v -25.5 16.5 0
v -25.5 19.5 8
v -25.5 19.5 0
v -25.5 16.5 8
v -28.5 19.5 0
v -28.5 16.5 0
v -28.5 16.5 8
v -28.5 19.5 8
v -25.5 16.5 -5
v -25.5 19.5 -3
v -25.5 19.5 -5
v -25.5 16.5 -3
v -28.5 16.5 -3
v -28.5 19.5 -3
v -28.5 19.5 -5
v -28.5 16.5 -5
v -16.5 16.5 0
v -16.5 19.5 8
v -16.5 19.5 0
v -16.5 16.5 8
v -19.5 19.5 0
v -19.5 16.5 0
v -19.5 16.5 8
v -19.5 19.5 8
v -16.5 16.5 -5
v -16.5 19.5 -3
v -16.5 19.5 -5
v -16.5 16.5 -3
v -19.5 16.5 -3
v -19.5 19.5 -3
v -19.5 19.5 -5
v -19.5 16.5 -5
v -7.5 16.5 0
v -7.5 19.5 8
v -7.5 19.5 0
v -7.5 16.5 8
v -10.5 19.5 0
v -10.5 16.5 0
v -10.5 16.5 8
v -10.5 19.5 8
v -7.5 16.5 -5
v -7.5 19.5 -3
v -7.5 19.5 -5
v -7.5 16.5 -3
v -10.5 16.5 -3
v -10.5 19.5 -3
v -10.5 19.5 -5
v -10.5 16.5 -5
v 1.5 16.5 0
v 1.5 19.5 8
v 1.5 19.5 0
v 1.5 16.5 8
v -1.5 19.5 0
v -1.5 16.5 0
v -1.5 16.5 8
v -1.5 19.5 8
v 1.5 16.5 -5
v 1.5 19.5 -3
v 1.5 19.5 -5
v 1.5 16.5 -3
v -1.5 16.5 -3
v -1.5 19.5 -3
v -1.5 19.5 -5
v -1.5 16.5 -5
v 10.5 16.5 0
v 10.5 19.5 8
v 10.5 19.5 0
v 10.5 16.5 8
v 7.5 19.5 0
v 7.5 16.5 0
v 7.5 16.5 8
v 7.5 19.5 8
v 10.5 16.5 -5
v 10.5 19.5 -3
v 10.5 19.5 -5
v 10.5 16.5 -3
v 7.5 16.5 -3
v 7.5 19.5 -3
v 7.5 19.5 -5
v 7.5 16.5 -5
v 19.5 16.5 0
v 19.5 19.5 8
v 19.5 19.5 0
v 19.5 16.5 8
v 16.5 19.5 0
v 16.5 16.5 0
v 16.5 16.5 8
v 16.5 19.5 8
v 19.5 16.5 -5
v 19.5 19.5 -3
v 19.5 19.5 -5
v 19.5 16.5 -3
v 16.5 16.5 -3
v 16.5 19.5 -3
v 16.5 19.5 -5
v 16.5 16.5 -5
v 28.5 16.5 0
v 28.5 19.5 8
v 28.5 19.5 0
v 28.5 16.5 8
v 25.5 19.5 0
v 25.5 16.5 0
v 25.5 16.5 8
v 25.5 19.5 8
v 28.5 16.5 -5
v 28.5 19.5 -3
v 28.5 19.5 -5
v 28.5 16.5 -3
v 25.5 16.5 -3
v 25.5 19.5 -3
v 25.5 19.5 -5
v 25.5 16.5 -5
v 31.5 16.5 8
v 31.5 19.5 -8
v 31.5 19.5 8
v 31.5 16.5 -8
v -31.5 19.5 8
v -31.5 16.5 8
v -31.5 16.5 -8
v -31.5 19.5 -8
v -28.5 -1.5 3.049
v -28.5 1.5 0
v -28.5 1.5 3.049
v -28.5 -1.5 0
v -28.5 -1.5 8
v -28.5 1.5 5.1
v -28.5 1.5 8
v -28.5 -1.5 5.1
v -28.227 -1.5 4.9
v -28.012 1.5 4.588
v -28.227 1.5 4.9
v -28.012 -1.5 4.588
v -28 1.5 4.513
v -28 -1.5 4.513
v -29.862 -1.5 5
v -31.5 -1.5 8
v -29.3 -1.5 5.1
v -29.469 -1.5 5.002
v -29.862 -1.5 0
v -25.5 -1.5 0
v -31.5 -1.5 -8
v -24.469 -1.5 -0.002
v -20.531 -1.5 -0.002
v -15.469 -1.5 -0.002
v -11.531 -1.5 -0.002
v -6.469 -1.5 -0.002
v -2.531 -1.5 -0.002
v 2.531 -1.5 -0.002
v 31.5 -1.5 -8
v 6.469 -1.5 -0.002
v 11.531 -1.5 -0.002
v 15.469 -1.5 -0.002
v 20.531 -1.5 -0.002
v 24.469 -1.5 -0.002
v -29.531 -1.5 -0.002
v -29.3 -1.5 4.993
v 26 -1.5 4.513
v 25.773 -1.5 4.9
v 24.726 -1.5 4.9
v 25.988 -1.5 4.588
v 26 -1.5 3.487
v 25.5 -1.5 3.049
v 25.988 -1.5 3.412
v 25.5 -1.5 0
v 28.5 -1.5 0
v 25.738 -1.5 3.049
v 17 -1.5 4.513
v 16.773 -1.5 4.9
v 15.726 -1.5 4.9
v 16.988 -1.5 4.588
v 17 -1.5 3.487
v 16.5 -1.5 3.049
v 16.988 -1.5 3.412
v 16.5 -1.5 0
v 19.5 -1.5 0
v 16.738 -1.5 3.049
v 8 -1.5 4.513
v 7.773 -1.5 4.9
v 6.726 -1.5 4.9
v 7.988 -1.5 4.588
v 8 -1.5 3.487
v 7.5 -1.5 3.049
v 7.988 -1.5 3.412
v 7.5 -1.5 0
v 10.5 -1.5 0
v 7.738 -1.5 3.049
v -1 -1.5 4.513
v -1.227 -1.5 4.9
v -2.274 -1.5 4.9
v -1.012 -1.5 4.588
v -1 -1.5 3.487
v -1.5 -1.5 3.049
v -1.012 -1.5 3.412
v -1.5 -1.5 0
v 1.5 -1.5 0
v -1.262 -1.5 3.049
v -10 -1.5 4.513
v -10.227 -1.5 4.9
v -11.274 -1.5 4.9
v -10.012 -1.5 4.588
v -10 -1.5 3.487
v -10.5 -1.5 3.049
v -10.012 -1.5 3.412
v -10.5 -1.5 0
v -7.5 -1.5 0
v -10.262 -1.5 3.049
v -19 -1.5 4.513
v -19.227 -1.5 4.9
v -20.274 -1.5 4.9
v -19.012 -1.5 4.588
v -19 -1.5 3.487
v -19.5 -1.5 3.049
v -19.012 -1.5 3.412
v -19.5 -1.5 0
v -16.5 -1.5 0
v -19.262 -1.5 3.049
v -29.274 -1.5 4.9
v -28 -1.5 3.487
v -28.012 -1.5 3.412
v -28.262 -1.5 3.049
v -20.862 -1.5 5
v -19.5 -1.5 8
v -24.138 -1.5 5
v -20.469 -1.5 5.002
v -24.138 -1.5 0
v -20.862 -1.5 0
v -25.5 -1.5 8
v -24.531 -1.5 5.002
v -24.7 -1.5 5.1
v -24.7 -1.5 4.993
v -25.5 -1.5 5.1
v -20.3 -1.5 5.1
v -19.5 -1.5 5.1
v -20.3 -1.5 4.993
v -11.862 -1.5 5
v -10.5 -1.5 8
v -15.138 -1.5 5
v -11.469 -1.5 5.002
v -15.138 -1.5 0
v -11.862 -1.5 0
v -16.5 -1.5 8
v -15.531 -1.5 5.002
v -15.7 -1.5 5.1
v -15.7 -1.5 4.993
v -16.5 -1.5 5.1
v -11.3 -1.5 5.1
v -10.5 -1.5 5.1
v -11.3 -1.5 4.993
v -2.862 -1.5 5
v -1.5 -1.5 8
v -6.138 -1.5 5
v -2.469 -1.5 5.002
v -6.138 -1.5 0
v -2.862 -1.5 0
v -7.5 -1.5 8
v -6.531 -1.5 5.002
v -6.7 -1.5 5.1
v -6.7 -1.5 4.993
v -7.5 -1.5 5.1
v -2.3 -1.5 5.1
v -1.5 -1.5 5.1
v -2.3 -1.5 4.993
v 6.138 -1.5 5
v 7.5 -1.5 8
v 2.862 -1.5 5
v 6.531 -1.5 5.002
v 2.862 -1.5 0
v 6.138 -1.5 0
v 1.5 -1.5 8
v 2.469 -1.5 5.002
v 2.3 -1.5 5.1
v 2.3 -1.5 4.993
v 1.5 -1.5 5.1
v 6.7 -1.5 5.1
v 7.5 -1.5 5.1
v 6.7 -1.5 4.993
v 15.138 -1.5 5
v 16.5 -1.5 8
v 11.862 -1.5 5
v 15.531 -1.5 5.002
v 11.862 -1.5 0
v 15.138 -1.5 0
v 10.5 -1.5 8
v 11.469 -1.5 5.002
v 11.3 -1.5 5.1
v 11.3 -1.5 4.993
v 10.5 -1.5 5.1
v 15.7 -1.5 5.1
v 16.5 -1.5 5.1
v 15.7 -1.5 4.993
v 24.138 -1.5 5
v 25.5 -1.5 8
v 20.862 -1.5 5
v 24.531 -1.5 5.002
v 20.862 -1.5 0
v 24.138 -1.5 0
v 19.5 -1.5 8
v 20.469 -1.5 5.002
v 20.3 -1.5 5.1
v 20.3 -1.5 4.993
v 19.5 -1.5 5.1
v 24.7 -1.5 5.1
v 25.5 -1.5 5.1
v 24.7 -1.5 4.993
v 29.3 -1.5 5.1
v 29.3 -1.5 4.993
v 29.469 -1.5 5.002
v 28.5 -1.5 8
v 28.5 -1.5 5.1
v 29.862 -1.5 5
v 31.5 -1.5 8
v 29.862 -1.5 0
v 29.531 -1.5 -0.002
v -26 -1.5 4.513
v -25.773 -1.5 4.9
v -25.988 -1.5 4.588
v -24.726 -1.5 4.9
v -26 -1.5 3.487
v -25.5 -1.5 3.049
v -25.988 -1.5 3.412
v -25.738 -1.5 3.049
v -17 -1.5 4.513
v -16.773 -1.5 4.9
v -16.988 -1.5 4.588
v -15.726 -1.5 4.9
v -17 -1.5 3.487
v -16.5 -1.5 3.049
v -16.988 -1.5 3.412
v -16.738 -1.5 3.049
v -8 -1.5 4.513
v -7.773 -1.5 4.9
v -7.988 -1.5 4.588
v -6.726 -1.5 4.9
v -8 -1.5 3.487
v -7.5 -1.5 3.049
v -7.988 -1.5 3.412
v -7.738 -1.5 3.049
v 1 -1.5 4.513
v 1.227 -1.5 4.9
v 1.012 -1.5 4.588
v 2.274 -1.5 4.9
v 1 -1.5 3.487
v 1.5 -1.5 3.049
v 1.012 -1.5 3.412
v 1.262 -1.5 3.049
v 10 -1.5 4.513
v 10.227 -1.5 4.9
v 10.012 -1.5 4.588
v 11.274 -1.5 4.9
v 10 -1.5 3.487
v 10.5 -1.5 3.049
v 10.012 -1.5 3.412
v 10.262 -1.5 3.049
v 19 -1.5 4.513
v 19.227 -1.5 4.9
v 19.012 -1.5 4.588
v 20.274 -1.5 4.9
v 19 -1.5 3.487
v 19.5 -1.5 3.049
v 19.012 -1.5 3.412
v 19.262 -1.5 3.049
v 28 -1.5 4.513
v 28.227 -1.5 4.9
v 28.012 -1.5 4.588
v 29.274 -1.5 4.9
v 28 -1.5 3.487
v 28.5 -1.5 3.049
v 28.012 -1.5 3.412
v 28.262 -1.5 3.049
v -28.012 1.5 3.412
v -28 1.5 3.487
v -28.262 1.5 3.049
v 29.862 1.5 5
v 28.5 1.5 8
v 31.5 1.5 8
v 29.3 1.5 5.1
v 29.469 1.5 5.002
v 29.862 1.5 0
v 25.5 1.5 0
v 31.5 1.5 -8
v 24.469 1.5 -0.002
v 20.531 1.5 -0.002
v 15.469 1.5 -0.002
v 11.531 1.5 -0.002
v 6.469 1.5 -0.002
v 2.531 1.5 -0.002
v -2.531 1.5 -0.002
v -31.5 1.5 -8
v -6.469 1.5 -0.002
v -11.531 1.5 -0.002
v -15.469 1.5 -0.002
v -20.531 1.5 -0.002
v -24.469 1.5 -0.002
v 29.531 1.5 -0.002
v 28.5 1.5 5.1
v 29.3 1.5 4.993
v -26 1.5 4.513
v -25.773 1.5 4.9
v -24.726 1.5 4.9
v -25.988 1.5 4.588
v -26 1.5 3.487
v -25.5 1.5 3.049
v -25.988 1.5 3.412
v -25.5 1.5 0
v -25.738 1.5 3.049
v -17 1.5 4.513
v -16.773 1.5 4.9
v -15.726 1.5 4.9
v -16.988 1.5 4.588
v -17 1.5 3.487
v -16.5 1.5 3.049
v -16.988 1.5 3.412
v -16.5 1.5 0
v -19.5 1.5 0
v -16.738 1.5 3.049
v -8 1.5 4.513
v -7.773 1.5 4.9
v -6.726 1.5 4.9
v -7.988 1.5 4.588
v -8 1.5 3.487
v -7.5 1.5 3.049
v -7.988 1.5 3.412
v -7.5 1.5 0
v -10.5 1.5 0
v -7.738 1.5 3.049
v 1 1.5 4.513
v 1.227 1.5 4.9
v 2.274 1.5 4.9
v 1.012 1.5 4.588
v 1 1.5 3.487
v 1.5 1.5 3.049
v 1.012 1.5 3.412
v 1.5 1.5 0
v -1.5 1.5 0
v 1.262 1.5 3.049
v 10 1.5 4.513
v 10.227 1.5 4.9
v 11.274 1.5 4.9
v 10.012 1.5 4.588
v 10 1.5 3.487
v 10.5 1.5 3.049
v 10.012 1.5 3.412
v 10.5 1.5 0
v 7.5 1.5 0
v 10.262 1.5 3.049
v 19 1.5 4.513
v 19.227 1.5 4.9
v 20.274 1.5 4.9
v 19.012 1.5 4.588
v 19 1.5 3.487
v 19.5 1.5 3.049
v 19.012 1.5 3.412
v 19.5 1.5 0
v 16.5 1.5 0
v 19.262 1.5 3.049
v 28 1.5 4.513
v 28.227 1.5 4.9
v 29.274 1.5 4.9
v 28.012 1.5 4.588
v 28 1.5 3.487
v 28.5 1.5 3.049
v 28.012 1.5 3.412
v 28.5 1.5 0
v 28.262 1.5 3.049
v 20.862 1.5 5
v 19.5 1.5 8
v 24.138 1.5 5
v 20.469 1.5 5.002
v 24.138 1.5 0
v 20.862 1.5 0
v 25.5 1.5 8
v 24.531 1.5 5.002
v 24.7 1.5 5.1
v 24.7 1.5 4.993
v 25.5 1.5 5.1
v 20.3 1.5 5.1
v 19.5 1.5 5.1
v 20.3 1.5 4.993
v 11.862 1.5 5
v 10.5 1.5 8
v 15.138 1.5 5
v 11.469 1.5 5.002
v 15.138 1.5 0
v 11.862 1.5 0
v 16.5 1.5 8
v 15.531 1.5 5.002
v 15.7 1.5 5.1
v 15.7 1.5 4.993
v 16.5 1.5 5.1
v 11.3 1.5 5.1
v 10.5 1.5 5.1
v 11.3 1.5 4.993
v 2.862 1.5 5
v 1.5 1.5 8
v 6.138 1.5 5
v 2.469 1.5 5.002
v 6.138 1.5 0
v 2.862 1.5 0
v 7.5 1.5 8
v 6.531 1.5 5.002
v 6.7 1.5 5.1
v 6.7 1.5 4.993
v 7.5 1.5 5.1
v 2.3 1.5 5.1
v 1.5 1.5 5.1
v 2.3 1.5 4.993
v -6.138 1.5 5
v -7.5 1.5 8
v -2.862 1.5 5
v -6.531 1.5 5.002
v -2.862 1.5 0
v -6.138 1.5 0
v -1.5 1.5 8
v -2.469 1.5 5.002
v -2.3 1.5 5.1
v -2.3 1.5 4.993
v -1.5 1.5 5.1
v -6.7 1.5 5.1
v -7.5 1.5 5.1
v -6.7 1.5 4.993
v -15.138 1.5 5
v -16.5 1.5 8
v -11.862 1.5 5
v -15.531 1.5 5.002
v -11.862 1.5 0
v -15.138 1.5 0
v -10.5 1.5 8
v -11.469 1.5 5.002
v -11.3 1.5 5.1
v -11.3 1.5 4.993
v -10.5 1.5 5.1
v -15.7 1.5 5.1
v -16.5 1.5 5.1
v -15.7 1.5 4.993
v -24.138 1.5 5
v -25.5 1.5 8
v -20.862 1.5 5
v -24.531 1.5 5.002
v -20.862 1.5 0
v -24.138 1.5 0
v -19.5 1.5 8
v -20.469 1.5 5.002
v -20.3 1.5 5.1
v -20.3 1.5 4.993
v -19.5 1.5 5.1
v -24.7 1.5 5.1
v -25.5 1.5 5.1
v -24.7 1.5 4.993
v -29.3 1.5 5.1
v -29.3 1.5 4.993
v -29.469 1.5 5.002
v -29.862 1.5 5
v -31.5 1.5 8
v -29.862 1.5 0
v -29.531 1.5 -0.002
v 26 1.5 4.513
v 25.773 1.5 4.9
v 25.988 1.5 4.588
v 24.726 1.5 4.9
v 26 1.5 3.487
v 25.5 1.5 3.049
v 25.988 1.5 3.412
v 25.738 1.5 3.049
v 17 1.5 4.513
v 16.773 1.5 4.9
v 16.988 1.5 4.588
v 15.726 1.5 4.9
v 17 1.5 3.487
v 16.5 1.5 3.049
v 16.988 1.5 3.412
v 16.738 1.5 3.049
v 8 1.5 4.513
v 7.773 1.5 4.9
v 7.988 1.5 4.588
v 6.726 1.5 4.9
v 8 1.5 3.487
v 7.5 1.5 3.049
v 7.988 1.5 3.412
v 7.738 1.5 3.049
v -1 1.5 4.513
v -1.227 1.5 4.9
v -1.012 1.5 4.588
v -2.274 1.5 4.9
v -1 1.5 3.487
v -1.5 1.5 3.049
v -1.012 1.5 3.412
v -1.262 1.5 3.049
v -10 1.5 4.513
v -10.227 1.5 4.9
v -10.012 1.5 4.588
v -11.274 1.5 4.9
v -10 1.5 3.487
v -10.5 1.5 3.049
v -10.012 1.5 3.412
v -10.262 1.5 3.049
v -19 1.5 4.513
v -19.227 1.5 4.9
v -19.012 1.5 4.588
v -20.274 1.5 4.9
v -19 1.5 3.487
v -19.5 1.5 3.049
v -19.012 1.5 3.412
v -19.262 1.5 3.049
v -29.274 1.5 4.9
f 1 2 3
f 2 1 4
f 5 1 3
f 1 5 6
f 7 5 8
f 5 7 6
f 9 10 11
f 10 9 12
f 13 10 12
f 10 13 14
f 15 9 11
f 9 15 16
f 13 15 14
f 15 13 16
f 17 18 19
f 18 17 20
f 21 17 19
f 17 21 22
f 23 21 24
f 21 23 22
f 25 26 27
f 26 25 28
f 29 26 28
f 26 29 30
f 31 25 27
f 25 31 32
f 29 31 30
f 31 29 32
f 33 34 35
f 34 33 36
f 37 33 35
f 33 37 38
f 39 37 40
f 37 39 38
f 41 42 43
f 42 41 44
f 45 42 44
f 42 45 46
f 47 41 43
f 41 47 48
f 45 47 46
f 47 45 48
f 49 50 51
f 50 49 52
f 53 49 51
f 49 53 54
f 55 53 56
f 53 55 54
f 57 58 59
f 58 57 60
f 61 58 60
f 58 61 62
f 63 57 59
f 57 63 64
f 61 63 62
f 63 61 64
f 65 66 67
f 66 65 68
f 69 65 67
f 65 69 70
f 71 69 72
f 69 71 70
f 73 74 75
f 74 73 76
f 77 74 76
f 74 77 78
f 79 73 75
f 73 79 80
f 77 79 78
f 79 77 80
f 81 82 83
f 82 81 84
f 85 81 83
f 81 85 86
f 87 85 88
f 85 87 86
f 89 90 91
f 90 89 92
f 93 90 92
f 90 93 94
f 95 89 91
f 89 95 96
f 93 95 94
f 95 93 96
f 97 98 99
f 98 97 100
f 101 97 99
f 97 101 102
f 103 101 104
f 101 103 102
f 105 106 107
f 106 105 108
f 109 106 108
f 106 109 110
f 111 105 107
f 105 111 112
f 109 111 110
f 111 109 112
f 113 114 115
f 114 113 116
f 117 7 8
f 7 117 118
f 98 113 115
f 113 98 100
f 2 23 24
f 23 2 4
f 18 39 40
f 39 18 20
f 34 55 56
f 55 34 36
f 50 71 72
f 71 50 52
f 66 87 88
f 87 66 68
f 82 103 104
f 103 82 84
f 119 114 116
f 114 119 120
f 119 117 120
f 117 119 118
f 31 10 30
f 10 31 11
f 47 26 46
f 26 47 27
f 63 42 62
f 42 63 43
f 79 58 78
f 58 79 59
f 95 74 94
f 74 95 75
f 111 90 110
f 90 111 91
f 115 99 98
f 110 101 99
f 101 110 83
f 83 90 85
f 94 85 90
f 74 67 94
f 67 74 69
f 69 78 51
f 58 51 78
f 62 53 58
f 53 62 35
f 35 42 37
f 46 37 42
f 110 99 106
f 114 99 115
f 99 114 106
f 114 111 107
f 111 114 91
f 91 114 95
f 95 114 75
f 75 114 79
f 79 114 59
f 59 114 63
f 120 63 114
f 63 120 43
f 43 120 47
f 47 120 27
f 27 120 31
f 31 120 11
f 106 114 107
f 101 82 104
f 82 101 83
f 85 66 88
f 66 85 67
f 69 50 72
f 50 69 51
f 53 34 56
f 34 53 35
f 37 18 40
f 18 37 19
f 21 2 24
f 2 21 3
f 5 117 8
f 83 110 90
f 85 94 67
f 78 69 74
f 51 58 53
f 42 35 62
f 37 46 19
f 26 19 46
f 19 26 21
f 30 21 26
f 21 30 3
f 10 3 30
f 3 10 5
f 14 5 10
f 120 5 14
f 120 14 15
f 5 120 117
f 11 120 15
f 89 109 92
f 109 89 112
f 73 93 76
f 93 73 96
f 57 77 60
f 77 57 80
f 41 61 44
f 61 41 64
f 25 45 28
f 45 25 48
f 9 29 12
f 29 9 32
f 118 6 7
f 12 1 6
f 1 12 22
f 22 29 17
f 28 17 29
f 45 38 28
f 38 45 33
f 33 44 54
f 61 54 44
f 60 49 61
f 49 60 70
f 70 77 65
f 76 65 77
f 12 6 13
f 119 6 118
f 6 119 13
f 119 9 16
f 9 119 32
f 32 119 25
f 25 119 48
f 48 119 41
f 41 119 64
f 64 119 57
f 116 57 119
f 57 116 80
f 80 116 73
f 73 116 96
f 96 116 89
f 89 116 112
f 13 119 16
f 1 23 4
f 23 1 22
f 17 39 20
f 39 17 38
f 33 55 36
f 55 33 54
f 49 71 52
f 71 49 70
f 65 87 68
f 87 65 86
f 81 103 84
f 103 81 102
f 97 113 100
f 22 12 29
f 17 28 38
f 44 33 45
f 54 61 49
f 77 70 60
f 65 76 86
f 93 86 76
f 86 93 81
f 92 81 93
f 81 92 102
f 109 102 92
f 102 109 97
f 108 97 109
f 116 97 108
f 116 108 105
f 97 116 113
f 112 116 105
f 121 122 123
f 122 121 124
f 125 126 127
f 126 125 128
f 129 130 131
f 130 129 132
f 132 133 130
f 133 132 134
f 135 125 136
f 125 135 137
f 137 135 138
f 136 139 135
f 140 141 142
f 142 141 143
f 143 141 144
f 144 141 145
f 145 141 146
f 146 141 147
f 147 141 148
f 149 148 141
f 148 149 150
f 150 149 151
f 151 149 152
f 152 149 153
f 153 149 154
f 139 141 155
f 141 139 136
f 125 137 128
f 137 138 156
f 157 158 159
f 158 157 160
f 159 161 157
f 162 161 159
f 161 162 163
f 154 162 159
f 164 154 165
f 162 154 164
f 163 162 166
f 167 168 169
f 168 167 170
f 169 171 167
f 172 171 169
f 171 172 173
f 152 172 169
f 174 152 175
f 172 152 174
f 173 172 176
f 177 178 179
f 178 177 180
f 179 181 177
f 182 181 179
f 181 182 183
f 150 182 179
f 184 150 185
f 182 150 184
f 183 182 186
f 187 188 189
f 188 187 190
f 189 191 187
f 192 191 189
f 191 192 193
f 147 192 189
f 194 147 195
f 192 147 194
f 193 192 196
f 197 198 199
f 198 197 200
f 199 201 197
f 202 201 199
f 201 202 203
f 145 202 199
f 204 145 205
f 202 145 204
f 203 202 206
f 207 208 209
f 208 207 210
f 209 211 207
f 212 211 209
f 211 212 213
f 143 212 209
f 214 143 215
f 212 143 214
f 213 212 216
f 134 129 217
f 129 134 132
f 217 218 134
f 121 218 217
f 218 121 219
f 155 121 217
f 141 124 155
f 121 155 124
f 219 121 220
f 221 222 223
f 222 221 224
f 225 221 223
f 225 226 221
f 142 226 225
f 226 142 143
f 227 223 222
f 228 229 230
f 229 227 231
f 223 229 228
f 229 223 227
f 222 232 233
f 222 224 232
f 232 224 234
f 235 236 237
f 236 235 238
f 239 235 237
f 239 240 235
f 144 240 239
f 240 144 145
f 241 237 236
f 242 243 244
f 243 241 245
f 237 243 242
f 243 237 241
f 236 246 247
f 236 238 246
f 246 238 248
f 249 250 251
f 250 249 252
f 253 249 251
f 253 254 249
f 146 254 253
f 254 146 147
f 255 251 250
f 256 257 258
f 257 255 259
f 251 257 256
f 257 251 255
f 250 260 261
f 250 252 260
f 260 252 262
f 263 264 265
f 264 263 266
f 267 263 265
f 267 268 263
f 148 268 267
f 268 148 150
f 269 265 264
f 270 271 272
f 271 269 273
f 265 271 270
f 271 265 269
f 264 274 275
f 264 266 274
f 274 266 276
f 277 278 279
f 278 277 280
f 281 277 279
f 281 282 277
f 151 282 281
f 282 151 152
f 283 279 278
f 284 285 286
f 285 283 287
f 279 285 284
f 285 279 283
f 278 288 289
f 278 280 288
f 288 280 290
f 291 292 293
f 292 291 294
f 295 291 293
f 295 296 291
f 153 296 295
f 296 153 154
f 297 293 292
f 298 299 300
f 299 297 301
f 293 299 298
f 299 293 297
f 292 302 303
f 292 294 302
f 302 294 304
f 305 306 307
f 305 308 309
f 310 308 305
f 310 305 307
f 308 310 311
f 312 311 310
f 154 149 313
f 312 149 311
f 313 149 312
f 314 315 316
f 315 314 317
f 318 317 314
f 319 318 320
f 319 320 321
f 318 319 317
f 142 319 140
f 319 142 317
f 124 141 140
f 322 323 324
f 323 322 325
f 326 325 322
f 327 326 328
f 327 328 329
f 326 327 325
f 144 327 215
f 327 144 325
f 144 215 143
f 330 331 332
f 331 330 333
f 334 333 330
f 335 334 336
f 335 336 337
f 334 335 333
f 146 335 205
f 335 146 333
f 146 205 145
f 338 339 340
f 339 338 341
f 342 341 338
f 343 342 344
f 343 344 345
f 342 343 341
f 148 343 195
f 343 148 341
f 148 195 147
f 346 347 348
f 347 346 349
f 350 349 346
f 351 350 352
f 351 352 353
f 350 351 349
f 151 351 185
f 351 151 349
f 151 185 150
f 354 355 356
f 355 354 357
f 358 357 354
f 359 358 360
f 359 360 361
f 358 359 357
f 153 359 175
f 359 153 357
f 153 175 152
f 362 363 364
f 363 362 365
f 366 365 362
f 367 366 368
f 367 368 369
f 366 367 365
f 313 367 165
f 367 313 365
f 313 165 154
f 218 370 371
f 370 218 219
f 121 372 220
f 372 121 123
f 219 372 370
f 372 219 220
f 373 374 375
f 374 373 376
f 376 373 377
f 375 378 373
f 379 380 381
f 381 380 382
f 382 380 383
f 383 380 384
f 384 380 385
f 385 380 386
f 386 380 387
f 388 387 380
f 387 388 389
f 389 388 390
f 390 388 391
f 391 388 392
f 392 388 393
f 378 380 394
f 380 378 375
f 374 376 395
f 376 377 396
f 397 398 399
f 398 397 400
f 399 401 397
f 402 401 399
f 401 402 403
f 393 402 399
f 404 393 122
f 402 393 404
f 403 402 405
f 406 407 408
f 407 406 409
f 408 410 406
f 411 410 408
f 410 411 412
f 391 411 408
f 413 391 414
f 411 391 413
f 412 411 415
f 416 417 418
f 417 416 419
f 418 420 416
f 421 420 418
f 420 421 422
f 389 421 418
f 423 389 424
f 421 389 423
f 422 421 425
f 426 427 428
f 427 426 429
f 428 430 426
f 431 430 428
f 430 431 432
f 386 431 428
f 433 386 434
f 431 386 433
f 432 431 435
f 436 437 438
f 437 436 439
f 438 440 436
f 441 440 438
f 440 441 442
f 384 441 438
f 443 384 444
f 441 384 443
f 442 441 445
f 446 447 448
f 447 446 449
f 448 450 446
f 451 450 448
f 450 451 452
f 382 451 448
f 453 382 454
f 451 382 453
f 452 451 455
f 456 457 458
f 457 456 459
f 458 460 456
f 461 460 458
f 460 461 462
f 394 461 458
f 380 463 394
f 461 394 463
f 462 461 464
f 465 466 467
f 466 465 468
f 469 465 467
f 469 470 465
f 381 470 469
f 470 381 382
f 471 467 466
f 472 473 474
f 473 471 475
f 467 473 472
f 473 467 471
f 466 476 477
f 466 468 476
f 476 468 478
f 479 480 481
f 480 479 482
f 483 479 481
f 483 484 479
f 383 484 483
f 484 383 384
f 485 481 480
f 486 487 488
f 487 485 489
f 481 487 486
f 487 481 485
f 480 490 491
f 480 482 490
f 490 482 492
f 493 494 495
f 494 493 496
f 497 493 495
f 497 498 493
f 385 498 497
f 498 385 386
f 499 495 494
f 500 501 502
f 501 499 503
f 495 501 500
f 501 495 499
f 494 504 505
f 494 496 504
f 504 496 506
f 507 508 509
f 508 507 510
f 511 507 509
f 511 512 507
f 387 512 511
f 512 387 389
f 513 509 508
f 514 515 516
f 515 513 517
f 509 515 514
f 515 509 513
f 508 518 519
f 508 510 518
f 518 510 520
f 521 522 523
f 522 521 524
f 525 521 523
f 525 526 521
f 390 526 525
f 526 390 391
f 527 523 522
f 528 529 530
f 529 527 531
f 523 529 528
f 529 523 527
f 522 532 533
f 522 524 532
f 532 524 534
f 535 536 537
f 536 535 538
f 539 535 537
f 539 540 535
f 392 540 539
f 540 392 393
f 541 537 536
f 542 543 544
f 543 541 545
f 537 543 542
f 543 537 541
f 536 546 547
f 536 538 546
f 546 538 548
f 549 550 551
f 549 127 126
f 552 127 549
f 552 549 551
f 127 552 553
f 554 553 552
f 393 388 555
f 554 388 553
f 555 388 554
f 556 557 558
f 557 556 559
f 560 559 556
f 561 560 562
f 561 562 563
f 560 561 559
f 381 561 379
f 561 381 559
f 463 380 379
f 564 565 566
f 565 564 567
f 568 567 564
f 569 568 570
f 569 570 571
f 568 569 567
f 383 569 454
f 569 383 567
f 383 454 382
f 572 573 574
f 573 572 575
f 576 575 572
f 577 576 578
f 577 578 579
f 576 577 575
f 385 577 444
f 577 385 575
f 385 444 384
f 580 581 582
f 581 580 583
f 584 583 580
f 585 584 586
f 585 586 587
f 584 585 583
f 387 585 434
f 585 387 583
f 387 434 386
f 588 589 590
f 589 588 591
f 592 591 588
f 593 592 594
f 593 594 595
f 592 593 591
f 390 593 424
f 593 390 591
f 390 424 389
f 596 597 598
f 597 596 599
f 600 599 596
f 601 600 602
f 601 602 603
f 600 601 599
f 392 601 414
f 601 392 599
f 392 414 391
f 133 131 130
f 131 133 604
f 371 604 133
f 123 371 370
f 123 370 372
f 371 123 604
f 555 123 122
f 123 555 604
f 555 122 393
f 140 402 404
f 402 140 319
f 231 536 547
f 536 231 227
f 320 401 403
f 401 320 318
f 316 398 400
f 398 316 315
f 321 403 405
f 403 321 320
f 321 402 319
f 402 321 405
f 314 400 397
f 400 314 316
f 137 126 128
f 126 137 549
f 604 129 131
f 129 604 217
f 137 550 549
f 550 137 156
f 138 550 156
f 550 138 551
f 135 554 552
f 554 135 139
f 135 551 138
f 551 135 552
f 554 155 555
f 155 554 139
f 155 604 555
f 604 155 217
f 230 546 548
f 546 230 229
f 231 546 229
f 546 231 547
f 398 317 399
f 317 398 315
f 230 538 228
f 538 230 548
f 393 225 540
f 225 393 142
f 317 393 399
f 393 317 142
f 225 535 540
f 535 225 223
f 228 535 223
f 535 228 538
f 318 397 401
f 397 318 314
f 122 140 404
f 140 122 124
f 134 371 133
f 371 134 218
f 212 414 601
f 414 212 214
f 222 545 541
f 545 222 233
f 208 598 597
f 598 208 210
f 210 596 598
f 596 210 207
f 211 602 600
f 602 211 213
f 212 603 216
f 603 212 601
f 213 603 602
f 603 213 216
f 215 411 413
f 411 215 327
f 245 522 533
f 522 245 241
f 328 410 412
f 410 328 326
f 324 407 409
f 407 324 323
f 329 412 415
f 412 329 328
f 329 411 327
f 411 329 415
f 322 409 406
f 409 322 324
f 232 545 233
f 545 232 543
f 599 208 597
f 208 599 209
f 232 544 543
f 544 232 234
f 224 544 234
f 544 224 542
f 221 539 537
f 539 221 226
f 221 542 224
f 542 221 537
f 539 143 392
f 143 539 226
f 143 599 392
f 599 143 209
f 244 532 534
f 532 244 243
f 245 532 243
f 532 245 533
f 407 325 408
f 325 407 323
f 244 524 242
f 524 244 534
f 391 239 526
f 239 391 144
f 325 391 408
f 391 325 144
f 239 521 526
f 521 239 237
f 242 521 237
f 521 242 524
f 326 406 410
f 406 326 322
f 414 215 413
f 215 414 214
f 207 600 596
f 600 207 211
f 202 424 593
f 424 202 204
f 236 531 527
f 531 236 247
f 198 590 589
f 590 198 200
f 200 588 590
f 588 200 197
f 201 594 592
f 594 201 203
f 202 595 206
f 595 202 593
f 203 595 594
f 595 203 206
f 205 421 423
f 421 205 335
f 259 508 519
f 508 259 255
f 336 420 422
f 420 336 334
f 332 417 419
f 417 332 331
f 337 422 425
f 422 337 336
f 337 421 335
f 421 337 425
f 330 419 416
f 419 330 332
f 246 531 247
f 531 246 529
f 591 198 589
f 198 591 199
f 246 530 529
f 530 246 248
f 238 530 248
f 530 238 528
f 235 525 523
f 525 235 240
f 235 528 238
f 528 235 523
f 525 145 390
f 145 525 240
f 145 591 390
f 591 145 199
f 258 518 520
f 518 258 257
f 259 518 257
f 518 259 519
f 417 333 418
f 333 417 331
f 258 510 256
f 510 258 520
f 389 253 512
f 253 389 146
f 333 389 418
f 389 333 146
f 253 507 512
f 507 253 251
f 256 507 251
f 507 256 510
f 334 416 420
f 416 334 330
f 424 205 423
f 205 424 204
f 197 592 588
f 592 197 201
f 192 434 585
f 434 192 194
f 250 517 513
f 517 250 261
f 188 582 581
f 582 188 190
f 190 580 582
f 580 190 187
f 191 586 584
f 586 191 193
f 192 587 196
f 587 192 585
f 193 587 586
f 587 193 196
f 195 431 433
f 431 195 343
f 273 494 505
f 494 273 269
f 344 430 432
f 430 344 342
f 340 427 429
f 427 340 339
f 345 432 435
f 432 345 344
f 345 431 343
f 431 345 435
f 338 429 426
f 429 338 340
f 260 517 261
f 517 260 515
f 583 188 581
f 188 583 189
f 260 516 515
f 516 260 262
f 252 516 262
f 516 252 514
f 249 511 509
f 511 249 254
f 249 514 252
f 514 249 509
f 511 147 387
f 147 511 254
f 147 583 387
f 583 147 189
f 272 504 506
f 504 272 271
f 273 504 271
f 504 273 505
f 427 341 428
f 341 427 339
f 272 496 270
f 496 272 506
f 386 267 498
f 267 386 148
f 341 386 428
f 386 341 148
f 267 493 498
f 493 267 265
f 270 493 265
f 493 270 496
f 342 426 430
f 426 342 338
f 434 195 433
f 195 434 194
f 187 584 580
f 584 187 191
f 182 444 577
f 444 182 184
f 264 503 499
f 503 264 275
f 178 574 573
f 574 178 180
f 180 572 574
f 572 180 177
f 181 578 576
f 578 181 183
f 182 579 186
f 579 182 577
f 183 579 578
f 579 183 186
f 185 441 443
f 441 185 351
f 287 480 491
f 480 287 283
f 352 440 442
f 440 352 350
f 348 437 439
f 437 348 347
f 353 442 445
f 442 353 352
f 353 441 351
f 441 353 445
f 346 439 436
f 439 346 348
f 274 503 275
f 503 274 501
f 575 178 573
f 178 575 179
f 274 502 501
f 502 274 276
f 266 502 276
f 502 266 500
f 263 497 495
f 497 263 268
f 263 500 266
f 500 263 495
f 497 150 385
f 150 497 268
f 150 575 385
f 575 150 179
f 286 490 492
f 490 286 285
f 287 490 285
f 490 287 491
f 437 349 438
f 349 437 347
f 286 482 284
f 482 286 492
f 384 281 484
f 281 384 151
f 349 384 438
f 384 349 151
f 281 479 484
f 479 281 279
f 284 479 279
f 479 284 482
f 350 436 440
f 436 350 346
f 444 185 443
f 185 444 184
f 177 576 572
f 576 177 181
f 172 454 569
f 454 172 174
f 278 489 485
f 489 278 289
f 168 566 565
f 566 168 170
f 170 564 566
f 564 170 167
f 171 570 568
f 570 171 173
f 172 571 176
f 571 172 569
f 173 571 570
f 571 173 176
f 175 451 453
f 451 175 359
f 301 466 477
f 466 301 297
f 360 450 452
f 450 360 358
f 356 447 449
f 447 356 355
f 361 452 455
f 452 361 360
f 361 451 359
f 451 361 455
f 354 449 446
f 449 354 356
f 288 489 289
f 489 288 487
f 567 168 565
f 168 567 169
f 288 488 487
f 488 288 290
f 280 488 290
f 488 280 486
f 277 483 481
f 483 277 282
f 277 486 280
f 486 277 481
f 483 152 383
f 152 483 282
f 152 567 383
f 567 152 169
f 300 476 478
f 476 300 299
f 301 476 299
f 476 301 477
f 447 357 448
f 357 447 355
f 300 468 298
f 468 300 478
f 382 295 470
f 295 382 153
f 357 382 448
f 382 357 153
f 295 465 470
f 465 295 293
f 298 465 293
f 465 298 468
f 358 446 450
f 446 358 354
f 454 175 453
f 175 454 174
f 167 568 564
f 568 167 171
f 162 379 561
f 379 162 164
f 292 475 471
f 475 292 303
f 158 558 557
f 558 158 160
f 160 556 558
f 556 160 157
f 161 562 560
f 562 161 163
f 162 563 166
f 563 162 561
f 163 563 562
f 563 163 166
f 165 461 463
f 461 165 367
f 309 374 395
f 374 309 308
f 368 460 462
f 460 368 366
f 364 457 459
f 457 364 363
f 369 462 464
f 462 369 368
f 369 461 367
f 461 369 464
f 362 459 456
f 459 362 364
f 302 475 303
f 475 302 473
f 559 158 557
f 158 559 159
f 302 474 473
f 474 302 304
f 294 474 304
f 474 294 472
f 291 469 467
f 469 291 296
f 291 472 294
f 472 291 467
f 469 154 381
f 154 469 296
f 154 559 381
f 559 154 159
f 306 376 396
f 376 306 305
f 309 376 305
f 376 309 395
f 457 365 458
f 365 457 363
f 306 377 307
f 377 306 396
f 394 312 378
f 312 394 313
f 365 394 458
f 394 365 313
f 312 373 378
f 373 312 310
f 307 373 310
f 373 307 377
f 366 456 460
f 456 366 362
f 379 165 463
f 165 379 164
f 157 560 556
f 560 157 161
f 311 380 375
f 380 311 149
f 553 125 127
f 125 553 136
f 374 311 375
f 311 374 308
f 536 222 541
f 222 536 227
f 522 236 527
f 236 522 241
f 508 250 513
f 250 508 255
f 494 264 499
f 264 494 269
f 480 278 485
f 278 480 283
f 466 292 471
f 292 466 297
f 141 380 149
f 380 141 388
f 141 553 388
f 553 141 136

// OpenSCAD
/* A drawer divider
 *
 * inspired by: http://www.thingiverse.com/thing:25581/#files
 * also inspired by: http://makezine.com/2012/04/13/cnc-panel-joinery-notebook/
 *
 * By: Alex Gaudio <adgaudio@gmail.com>
 */

// Configurable vars:

thickness = 3;
lower_gap_height = 2;
// end-to-end length
length = 7 * thickness * 3; // suggested min length: thickness * 3

height = 2*(2*thickness + lower_gap_height); // suggested min height: 2*(2 * thickness + lower_gap_height);
dist_between_gaps = 2*thickness;


// Suggested Non-customizable vars
detent_height=lower_gap_height/3;
detent_width=thickness/3/2; // suggested: don't bother too much with this. it's finicky
detent_swing_min_tolerance=0.2;
detent_angle = 3;  // TODO: adjust this based on detent_width
// todo: adjust dist_between gaps based on detent_width and thickness
divider_upper_gap_height = height/2;
insert_upper_gap_height = (height - divider_upper_gap_height - thickness - lower_gap_height);
gap_width = dist_between_gaps + thickness;

module ticks_cutout(type) {
  /* Meant to be used like below.  `type` is either "divider" or "insert"
   *
   *    difference() { some_object; ticks_cutout(type="divider"); }
   */
  _inner_length = length - 3*thickness;
  for (x=[0:_inner_length/gap_width]) {
    translate([_inner_length/-2 + x*gap_width, 0, 0]) {
      if (type == "divider") {
        divider_cutout();
      } else if (type == "insert") {
        insert_cutout();
      }
    }
  }
}

module divider_cutout() {
  // upper hole
  translate([0, 0, height/2 + 1 - divider_upper_gap_height/2])
    cube([thickness, thickness + 1, divider_upper_gap_height + 2], center=true);
  // lower hole
  translate([0, 0, height/2 - divider_upper_gap_height - thickness - lower_gap_height/2])
    cube([thickness, thickness + 1, lower_gap_height], center=true);
}

module insert_cutout() {
  // small middle section between detents running through insert
  translate([0, 0, height/2 - (height - divider_upper_gap_height)/2 + 1])
    cube([thickness - 2 * detent_width, thickness + 1, height - divider_upper_gap_height + 2], center=true);
  // hole towards middle of insert
  translate([0, 0, thickness/2])
    cube([thickness, thickness + 1, thickness], center=true);
  // hole towards tip of insert
  translate([0, 0, thickness + lower_gap_height + insert_upper_gap_height/2 + 1])
    cube([thickness, thickness + 1, insert_upper_gap_height + 2], center=true);
  // detent
  translate([0, 0, thickness + lower_gap_height/2]) {
    rotate([90, 0, 0]) {
    for (sign=[-1, 1]) {
    translate([(thickness/2 - detent_width/2) * sign, 0, 0]) {
    difference() {
      translate([sign*-.01, 0, 0])
        scale([detent_width + .02, thickness + 1, thickness + 1])
          cube([1, 1, 1], center=true);
      translate([detent_width/3 * sign, 0, 0])
        scale([detent_width, lower_gap_height/2, 1])
          cylinder(r=1, h=thickness, center=true, $fn=10);
    }
  }}}}
  // make detent have a space to compress inwards when inserting
  translate([0, 0, thickness + lower_gap_height])
  for (sign=[-1, 1]) {
    translate([sign*thickness/2 + sign*1/2, 0, 0]) {
      // small horizontal line to make space for detent to swing inwards
      translate([sign*(-1/2+detent_swing_min_tolerance), 0, 0])
        cube([detent_swing_min_tolerance+1,
              thickness + 1,
              detent_swing_min_tolerance],
             center=true);
      // cut out a hull of hollow space for detent to swing inwards
      translate([sign*1/2, 0, 5/-2])
      hull() {
        rotate([0, sign*detent_angle, 180])
          cube([detent_swing_min_tolerance, thickness+1, 5], center=true);
        translate([sign * sin(detent_angle) * 5, 0, 0])
        cube([detent_swing_min_tolerance, thickness+1, 5], center=true);
      }
    }
  }
}

module divider() {
  difference() {
    cube([length, thickness, height], center=true);
    ticks_cutout(type="divider");
  }
}

module insert() {
  difference() {
    cube([length, thickness, height], center=true);
    ticks_cutout("insert");
  }
}
translate([0, thickness + 15, 0])
/*rotate([180, 0, 90])*/
divider();
insert();
